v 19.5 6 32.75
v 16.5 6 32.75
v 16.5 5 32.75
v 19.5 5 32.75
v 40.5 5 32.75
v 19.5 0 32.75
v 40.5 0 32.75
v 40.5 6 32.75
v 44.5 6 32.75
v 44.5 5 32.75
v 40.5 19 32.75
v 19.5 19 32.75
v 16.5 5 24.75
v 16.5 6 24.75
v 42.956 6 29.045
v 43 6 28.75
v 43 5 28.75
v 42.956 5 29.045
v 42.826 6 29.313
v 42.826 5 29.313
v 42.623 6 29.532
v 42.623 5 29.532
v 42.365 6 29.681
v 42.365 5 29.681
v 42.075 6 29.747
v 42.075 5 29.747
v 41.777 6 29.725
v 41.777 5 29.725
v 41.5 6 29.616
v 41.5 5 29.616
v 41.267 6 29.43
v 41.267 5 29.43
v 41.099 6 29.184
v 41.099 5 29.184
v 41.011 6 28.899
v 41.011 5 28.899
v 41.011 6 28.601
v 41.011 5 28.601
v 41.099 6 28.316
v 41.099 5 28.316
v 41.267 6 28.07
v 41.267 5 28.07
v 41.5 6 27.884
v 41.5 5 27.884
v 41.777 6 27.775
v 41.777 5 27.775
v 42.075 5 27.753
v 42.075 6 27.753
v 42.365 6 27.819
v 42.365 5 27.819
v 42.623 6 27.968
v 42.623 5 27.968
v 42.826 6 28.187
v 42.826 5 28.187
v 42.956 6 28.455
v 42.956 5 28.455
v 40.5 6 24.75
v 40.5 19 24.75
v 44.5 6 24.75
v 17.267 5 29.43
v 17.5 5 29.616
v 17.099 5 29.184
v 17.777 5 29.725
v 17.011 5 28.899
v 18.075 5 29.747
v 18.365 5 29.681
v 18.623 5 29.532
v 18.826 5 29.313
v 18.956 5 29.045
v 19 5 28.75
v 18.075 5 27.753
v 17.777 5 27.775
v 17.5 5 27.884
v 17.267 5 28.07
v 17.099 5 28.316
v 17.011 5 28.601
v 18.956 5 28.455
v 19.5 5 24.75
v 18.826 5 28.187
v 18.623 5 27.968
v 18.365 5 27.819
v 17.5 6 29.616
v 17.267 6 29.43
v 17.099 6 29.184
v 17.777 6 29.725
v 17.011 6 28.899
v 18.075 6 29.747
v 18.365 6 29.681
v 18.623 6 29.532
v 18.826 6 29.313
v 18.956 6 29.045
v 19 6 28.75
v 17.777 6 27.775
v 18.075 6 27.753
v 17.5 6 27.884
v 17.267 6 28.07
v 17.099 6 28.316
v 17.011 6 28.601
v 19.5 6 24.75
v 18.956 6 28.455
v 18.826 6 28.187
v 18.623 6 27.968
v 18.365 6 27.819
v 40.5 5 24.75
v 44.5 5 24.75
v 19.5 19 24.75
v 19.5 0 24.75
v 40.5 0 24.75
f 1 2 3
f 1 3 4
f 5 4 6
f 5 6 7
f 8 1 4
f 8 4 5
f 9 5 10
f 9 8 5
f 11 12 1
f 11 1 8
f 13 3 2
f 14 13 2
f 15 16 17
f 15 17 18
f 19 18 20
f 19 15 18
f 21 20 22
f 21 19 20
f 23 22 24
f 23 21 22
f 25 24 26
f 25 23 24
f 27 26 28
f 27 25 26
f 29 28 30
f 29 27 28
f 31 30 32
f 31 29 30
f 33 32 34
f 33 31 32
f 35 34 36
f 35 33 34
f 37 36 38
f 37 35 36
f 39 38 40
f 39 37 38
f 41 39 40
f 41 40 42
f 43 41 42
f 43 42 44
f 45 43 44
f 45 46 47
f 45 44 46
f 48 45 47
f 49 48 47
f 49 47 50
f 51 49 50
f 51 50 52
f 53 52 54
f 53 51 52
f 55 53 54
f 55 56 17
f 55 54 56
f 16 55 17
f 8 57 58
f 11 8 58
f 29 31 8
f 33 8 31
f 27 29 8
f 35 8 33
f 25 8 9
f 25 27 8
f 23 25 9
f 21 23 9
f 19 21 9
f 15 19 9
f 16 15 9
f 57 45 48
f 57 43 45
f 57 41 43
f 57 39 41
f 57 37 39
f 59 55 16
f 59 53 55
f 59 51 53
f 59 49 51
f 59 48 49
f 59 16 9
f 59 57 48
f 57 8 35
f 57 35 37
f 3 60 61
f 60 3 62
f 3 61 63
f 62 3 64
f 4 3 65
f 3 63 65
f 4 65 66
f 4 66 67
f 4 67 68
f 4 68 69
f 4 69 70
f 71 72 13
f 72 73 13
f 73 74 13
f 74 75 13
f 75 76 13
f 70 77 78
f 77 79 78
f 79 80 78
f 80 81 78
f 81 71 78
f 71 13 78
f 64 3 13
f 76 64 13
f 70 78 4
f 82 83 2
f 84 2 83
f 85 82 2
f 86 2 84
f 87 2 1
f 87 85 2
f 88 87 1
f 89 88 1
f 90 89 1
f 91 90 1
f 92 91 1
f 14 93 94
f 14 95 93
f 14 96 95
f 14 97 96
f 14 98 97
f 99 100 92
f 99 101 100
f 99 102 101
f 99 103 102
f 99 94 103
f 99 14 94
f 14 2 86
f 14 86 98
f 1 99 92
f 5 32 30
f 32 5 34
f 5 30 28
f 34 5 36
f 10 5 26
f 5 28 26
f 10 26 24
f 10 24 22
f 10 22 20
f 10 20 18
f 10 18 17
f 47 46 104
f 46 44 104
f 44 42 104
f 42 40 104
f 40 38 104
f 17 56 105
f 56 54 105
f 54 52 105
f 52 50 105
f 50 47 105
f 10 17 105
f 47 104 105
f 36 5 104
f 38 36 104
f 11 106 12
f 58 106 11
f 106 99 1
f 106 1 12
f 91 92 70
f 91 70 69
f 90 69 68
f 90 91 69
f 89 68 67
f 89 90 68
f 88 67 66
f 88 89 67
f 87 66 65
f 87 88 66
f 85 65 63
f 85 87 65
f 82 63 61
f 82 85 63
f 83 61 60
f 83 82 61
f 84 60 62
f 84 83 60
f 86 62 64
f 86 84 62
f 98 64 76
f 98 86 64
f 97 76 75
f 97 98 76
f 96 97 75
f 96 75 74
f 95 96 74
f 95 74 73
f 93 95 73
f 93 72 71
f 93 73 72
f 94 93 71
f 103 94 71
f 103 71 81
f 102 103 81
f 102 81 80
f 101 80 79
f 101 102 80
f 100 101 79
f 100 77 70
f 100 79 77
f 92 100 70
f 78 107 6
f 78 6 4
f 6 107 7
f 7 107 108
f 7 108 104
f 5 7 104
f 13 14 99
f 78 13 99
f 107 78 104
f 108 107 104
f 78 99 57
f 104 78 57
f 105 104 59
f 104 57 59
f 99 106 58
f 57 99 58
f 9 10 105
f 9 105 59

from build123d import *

# Parameters (mm, degrees)
CYLINDER323_R     = 1
CYLINDER323_DEPTH = 20
CYLINDER324_R     = 1
CYLINDER324_DEPTH = 20
BOX238_W          = 28
BOX238_H          = 1
BOX238_DEPTH      = 8
BOX237_W          = 21
BOX237_H          = 19
BOX237_DEPTH      = 8


with BuildPart() as zylinder325:
    # Cylinder323 → Cylinder323 (new body)
    with BuildSketch(Plane(origin=(22.5, 23, 30.5), x_dir=(1, 0, 0), z_dir=(0, -1, 0))):
        Circle(CYLINDER323_R)
    extrude(amount=CYLINDER323_DEPTH)


with BuildPart() as fusion215:
    # Cylinder324 → Cylinder324 (new body)
    with BuildSketch(Plane(origin=(-1.5, 23, 30.5), x_dir=(1, 0, 0), z_dir=(0, -1, 0))):
        Circle(CYLINDER324_R)
    extrude(amount=CYLINDER324_DEPTH)

    # Fusion215: union Zylinder325
    add(zylinder325.part)


with BuildPart() as w_rfel225:
    # Box238 → Box238 (new body)
    with BuildSketch(Plane(origin=(-3, 5, 26.5), x_dir=(1, 0, 0), z_dir=(0, 0, 1))):
        with Locations((14, 0.5)):
            Rectangle(BOX238_W, BOX238_H)
    extrude(amount=BOX238_DEPTH)


with BuildPart() as miniservo:
    # Box237 → Box237 (new body)
    with BuildSketch(Plane.XY.offset(26.5)):
        with Locations((10.5, 9.5)):
            Rectangle(BOX237_W, BOX237_H)
    extrude(amount=BOX237_DEPTH)

    # Fusion214: union Würfel225
    add(w_rfel225.part)

    # Cut148: cut Fusion215
    add(fusion215.part, mode=Mode.SUBTRACT)


with BuildPart() as miniservo_1:
    # Cut148 placement: moved
    add(miniservo.part.moved(Location((19.5, 0, -1.75))))


solid = miniservo_1.part
